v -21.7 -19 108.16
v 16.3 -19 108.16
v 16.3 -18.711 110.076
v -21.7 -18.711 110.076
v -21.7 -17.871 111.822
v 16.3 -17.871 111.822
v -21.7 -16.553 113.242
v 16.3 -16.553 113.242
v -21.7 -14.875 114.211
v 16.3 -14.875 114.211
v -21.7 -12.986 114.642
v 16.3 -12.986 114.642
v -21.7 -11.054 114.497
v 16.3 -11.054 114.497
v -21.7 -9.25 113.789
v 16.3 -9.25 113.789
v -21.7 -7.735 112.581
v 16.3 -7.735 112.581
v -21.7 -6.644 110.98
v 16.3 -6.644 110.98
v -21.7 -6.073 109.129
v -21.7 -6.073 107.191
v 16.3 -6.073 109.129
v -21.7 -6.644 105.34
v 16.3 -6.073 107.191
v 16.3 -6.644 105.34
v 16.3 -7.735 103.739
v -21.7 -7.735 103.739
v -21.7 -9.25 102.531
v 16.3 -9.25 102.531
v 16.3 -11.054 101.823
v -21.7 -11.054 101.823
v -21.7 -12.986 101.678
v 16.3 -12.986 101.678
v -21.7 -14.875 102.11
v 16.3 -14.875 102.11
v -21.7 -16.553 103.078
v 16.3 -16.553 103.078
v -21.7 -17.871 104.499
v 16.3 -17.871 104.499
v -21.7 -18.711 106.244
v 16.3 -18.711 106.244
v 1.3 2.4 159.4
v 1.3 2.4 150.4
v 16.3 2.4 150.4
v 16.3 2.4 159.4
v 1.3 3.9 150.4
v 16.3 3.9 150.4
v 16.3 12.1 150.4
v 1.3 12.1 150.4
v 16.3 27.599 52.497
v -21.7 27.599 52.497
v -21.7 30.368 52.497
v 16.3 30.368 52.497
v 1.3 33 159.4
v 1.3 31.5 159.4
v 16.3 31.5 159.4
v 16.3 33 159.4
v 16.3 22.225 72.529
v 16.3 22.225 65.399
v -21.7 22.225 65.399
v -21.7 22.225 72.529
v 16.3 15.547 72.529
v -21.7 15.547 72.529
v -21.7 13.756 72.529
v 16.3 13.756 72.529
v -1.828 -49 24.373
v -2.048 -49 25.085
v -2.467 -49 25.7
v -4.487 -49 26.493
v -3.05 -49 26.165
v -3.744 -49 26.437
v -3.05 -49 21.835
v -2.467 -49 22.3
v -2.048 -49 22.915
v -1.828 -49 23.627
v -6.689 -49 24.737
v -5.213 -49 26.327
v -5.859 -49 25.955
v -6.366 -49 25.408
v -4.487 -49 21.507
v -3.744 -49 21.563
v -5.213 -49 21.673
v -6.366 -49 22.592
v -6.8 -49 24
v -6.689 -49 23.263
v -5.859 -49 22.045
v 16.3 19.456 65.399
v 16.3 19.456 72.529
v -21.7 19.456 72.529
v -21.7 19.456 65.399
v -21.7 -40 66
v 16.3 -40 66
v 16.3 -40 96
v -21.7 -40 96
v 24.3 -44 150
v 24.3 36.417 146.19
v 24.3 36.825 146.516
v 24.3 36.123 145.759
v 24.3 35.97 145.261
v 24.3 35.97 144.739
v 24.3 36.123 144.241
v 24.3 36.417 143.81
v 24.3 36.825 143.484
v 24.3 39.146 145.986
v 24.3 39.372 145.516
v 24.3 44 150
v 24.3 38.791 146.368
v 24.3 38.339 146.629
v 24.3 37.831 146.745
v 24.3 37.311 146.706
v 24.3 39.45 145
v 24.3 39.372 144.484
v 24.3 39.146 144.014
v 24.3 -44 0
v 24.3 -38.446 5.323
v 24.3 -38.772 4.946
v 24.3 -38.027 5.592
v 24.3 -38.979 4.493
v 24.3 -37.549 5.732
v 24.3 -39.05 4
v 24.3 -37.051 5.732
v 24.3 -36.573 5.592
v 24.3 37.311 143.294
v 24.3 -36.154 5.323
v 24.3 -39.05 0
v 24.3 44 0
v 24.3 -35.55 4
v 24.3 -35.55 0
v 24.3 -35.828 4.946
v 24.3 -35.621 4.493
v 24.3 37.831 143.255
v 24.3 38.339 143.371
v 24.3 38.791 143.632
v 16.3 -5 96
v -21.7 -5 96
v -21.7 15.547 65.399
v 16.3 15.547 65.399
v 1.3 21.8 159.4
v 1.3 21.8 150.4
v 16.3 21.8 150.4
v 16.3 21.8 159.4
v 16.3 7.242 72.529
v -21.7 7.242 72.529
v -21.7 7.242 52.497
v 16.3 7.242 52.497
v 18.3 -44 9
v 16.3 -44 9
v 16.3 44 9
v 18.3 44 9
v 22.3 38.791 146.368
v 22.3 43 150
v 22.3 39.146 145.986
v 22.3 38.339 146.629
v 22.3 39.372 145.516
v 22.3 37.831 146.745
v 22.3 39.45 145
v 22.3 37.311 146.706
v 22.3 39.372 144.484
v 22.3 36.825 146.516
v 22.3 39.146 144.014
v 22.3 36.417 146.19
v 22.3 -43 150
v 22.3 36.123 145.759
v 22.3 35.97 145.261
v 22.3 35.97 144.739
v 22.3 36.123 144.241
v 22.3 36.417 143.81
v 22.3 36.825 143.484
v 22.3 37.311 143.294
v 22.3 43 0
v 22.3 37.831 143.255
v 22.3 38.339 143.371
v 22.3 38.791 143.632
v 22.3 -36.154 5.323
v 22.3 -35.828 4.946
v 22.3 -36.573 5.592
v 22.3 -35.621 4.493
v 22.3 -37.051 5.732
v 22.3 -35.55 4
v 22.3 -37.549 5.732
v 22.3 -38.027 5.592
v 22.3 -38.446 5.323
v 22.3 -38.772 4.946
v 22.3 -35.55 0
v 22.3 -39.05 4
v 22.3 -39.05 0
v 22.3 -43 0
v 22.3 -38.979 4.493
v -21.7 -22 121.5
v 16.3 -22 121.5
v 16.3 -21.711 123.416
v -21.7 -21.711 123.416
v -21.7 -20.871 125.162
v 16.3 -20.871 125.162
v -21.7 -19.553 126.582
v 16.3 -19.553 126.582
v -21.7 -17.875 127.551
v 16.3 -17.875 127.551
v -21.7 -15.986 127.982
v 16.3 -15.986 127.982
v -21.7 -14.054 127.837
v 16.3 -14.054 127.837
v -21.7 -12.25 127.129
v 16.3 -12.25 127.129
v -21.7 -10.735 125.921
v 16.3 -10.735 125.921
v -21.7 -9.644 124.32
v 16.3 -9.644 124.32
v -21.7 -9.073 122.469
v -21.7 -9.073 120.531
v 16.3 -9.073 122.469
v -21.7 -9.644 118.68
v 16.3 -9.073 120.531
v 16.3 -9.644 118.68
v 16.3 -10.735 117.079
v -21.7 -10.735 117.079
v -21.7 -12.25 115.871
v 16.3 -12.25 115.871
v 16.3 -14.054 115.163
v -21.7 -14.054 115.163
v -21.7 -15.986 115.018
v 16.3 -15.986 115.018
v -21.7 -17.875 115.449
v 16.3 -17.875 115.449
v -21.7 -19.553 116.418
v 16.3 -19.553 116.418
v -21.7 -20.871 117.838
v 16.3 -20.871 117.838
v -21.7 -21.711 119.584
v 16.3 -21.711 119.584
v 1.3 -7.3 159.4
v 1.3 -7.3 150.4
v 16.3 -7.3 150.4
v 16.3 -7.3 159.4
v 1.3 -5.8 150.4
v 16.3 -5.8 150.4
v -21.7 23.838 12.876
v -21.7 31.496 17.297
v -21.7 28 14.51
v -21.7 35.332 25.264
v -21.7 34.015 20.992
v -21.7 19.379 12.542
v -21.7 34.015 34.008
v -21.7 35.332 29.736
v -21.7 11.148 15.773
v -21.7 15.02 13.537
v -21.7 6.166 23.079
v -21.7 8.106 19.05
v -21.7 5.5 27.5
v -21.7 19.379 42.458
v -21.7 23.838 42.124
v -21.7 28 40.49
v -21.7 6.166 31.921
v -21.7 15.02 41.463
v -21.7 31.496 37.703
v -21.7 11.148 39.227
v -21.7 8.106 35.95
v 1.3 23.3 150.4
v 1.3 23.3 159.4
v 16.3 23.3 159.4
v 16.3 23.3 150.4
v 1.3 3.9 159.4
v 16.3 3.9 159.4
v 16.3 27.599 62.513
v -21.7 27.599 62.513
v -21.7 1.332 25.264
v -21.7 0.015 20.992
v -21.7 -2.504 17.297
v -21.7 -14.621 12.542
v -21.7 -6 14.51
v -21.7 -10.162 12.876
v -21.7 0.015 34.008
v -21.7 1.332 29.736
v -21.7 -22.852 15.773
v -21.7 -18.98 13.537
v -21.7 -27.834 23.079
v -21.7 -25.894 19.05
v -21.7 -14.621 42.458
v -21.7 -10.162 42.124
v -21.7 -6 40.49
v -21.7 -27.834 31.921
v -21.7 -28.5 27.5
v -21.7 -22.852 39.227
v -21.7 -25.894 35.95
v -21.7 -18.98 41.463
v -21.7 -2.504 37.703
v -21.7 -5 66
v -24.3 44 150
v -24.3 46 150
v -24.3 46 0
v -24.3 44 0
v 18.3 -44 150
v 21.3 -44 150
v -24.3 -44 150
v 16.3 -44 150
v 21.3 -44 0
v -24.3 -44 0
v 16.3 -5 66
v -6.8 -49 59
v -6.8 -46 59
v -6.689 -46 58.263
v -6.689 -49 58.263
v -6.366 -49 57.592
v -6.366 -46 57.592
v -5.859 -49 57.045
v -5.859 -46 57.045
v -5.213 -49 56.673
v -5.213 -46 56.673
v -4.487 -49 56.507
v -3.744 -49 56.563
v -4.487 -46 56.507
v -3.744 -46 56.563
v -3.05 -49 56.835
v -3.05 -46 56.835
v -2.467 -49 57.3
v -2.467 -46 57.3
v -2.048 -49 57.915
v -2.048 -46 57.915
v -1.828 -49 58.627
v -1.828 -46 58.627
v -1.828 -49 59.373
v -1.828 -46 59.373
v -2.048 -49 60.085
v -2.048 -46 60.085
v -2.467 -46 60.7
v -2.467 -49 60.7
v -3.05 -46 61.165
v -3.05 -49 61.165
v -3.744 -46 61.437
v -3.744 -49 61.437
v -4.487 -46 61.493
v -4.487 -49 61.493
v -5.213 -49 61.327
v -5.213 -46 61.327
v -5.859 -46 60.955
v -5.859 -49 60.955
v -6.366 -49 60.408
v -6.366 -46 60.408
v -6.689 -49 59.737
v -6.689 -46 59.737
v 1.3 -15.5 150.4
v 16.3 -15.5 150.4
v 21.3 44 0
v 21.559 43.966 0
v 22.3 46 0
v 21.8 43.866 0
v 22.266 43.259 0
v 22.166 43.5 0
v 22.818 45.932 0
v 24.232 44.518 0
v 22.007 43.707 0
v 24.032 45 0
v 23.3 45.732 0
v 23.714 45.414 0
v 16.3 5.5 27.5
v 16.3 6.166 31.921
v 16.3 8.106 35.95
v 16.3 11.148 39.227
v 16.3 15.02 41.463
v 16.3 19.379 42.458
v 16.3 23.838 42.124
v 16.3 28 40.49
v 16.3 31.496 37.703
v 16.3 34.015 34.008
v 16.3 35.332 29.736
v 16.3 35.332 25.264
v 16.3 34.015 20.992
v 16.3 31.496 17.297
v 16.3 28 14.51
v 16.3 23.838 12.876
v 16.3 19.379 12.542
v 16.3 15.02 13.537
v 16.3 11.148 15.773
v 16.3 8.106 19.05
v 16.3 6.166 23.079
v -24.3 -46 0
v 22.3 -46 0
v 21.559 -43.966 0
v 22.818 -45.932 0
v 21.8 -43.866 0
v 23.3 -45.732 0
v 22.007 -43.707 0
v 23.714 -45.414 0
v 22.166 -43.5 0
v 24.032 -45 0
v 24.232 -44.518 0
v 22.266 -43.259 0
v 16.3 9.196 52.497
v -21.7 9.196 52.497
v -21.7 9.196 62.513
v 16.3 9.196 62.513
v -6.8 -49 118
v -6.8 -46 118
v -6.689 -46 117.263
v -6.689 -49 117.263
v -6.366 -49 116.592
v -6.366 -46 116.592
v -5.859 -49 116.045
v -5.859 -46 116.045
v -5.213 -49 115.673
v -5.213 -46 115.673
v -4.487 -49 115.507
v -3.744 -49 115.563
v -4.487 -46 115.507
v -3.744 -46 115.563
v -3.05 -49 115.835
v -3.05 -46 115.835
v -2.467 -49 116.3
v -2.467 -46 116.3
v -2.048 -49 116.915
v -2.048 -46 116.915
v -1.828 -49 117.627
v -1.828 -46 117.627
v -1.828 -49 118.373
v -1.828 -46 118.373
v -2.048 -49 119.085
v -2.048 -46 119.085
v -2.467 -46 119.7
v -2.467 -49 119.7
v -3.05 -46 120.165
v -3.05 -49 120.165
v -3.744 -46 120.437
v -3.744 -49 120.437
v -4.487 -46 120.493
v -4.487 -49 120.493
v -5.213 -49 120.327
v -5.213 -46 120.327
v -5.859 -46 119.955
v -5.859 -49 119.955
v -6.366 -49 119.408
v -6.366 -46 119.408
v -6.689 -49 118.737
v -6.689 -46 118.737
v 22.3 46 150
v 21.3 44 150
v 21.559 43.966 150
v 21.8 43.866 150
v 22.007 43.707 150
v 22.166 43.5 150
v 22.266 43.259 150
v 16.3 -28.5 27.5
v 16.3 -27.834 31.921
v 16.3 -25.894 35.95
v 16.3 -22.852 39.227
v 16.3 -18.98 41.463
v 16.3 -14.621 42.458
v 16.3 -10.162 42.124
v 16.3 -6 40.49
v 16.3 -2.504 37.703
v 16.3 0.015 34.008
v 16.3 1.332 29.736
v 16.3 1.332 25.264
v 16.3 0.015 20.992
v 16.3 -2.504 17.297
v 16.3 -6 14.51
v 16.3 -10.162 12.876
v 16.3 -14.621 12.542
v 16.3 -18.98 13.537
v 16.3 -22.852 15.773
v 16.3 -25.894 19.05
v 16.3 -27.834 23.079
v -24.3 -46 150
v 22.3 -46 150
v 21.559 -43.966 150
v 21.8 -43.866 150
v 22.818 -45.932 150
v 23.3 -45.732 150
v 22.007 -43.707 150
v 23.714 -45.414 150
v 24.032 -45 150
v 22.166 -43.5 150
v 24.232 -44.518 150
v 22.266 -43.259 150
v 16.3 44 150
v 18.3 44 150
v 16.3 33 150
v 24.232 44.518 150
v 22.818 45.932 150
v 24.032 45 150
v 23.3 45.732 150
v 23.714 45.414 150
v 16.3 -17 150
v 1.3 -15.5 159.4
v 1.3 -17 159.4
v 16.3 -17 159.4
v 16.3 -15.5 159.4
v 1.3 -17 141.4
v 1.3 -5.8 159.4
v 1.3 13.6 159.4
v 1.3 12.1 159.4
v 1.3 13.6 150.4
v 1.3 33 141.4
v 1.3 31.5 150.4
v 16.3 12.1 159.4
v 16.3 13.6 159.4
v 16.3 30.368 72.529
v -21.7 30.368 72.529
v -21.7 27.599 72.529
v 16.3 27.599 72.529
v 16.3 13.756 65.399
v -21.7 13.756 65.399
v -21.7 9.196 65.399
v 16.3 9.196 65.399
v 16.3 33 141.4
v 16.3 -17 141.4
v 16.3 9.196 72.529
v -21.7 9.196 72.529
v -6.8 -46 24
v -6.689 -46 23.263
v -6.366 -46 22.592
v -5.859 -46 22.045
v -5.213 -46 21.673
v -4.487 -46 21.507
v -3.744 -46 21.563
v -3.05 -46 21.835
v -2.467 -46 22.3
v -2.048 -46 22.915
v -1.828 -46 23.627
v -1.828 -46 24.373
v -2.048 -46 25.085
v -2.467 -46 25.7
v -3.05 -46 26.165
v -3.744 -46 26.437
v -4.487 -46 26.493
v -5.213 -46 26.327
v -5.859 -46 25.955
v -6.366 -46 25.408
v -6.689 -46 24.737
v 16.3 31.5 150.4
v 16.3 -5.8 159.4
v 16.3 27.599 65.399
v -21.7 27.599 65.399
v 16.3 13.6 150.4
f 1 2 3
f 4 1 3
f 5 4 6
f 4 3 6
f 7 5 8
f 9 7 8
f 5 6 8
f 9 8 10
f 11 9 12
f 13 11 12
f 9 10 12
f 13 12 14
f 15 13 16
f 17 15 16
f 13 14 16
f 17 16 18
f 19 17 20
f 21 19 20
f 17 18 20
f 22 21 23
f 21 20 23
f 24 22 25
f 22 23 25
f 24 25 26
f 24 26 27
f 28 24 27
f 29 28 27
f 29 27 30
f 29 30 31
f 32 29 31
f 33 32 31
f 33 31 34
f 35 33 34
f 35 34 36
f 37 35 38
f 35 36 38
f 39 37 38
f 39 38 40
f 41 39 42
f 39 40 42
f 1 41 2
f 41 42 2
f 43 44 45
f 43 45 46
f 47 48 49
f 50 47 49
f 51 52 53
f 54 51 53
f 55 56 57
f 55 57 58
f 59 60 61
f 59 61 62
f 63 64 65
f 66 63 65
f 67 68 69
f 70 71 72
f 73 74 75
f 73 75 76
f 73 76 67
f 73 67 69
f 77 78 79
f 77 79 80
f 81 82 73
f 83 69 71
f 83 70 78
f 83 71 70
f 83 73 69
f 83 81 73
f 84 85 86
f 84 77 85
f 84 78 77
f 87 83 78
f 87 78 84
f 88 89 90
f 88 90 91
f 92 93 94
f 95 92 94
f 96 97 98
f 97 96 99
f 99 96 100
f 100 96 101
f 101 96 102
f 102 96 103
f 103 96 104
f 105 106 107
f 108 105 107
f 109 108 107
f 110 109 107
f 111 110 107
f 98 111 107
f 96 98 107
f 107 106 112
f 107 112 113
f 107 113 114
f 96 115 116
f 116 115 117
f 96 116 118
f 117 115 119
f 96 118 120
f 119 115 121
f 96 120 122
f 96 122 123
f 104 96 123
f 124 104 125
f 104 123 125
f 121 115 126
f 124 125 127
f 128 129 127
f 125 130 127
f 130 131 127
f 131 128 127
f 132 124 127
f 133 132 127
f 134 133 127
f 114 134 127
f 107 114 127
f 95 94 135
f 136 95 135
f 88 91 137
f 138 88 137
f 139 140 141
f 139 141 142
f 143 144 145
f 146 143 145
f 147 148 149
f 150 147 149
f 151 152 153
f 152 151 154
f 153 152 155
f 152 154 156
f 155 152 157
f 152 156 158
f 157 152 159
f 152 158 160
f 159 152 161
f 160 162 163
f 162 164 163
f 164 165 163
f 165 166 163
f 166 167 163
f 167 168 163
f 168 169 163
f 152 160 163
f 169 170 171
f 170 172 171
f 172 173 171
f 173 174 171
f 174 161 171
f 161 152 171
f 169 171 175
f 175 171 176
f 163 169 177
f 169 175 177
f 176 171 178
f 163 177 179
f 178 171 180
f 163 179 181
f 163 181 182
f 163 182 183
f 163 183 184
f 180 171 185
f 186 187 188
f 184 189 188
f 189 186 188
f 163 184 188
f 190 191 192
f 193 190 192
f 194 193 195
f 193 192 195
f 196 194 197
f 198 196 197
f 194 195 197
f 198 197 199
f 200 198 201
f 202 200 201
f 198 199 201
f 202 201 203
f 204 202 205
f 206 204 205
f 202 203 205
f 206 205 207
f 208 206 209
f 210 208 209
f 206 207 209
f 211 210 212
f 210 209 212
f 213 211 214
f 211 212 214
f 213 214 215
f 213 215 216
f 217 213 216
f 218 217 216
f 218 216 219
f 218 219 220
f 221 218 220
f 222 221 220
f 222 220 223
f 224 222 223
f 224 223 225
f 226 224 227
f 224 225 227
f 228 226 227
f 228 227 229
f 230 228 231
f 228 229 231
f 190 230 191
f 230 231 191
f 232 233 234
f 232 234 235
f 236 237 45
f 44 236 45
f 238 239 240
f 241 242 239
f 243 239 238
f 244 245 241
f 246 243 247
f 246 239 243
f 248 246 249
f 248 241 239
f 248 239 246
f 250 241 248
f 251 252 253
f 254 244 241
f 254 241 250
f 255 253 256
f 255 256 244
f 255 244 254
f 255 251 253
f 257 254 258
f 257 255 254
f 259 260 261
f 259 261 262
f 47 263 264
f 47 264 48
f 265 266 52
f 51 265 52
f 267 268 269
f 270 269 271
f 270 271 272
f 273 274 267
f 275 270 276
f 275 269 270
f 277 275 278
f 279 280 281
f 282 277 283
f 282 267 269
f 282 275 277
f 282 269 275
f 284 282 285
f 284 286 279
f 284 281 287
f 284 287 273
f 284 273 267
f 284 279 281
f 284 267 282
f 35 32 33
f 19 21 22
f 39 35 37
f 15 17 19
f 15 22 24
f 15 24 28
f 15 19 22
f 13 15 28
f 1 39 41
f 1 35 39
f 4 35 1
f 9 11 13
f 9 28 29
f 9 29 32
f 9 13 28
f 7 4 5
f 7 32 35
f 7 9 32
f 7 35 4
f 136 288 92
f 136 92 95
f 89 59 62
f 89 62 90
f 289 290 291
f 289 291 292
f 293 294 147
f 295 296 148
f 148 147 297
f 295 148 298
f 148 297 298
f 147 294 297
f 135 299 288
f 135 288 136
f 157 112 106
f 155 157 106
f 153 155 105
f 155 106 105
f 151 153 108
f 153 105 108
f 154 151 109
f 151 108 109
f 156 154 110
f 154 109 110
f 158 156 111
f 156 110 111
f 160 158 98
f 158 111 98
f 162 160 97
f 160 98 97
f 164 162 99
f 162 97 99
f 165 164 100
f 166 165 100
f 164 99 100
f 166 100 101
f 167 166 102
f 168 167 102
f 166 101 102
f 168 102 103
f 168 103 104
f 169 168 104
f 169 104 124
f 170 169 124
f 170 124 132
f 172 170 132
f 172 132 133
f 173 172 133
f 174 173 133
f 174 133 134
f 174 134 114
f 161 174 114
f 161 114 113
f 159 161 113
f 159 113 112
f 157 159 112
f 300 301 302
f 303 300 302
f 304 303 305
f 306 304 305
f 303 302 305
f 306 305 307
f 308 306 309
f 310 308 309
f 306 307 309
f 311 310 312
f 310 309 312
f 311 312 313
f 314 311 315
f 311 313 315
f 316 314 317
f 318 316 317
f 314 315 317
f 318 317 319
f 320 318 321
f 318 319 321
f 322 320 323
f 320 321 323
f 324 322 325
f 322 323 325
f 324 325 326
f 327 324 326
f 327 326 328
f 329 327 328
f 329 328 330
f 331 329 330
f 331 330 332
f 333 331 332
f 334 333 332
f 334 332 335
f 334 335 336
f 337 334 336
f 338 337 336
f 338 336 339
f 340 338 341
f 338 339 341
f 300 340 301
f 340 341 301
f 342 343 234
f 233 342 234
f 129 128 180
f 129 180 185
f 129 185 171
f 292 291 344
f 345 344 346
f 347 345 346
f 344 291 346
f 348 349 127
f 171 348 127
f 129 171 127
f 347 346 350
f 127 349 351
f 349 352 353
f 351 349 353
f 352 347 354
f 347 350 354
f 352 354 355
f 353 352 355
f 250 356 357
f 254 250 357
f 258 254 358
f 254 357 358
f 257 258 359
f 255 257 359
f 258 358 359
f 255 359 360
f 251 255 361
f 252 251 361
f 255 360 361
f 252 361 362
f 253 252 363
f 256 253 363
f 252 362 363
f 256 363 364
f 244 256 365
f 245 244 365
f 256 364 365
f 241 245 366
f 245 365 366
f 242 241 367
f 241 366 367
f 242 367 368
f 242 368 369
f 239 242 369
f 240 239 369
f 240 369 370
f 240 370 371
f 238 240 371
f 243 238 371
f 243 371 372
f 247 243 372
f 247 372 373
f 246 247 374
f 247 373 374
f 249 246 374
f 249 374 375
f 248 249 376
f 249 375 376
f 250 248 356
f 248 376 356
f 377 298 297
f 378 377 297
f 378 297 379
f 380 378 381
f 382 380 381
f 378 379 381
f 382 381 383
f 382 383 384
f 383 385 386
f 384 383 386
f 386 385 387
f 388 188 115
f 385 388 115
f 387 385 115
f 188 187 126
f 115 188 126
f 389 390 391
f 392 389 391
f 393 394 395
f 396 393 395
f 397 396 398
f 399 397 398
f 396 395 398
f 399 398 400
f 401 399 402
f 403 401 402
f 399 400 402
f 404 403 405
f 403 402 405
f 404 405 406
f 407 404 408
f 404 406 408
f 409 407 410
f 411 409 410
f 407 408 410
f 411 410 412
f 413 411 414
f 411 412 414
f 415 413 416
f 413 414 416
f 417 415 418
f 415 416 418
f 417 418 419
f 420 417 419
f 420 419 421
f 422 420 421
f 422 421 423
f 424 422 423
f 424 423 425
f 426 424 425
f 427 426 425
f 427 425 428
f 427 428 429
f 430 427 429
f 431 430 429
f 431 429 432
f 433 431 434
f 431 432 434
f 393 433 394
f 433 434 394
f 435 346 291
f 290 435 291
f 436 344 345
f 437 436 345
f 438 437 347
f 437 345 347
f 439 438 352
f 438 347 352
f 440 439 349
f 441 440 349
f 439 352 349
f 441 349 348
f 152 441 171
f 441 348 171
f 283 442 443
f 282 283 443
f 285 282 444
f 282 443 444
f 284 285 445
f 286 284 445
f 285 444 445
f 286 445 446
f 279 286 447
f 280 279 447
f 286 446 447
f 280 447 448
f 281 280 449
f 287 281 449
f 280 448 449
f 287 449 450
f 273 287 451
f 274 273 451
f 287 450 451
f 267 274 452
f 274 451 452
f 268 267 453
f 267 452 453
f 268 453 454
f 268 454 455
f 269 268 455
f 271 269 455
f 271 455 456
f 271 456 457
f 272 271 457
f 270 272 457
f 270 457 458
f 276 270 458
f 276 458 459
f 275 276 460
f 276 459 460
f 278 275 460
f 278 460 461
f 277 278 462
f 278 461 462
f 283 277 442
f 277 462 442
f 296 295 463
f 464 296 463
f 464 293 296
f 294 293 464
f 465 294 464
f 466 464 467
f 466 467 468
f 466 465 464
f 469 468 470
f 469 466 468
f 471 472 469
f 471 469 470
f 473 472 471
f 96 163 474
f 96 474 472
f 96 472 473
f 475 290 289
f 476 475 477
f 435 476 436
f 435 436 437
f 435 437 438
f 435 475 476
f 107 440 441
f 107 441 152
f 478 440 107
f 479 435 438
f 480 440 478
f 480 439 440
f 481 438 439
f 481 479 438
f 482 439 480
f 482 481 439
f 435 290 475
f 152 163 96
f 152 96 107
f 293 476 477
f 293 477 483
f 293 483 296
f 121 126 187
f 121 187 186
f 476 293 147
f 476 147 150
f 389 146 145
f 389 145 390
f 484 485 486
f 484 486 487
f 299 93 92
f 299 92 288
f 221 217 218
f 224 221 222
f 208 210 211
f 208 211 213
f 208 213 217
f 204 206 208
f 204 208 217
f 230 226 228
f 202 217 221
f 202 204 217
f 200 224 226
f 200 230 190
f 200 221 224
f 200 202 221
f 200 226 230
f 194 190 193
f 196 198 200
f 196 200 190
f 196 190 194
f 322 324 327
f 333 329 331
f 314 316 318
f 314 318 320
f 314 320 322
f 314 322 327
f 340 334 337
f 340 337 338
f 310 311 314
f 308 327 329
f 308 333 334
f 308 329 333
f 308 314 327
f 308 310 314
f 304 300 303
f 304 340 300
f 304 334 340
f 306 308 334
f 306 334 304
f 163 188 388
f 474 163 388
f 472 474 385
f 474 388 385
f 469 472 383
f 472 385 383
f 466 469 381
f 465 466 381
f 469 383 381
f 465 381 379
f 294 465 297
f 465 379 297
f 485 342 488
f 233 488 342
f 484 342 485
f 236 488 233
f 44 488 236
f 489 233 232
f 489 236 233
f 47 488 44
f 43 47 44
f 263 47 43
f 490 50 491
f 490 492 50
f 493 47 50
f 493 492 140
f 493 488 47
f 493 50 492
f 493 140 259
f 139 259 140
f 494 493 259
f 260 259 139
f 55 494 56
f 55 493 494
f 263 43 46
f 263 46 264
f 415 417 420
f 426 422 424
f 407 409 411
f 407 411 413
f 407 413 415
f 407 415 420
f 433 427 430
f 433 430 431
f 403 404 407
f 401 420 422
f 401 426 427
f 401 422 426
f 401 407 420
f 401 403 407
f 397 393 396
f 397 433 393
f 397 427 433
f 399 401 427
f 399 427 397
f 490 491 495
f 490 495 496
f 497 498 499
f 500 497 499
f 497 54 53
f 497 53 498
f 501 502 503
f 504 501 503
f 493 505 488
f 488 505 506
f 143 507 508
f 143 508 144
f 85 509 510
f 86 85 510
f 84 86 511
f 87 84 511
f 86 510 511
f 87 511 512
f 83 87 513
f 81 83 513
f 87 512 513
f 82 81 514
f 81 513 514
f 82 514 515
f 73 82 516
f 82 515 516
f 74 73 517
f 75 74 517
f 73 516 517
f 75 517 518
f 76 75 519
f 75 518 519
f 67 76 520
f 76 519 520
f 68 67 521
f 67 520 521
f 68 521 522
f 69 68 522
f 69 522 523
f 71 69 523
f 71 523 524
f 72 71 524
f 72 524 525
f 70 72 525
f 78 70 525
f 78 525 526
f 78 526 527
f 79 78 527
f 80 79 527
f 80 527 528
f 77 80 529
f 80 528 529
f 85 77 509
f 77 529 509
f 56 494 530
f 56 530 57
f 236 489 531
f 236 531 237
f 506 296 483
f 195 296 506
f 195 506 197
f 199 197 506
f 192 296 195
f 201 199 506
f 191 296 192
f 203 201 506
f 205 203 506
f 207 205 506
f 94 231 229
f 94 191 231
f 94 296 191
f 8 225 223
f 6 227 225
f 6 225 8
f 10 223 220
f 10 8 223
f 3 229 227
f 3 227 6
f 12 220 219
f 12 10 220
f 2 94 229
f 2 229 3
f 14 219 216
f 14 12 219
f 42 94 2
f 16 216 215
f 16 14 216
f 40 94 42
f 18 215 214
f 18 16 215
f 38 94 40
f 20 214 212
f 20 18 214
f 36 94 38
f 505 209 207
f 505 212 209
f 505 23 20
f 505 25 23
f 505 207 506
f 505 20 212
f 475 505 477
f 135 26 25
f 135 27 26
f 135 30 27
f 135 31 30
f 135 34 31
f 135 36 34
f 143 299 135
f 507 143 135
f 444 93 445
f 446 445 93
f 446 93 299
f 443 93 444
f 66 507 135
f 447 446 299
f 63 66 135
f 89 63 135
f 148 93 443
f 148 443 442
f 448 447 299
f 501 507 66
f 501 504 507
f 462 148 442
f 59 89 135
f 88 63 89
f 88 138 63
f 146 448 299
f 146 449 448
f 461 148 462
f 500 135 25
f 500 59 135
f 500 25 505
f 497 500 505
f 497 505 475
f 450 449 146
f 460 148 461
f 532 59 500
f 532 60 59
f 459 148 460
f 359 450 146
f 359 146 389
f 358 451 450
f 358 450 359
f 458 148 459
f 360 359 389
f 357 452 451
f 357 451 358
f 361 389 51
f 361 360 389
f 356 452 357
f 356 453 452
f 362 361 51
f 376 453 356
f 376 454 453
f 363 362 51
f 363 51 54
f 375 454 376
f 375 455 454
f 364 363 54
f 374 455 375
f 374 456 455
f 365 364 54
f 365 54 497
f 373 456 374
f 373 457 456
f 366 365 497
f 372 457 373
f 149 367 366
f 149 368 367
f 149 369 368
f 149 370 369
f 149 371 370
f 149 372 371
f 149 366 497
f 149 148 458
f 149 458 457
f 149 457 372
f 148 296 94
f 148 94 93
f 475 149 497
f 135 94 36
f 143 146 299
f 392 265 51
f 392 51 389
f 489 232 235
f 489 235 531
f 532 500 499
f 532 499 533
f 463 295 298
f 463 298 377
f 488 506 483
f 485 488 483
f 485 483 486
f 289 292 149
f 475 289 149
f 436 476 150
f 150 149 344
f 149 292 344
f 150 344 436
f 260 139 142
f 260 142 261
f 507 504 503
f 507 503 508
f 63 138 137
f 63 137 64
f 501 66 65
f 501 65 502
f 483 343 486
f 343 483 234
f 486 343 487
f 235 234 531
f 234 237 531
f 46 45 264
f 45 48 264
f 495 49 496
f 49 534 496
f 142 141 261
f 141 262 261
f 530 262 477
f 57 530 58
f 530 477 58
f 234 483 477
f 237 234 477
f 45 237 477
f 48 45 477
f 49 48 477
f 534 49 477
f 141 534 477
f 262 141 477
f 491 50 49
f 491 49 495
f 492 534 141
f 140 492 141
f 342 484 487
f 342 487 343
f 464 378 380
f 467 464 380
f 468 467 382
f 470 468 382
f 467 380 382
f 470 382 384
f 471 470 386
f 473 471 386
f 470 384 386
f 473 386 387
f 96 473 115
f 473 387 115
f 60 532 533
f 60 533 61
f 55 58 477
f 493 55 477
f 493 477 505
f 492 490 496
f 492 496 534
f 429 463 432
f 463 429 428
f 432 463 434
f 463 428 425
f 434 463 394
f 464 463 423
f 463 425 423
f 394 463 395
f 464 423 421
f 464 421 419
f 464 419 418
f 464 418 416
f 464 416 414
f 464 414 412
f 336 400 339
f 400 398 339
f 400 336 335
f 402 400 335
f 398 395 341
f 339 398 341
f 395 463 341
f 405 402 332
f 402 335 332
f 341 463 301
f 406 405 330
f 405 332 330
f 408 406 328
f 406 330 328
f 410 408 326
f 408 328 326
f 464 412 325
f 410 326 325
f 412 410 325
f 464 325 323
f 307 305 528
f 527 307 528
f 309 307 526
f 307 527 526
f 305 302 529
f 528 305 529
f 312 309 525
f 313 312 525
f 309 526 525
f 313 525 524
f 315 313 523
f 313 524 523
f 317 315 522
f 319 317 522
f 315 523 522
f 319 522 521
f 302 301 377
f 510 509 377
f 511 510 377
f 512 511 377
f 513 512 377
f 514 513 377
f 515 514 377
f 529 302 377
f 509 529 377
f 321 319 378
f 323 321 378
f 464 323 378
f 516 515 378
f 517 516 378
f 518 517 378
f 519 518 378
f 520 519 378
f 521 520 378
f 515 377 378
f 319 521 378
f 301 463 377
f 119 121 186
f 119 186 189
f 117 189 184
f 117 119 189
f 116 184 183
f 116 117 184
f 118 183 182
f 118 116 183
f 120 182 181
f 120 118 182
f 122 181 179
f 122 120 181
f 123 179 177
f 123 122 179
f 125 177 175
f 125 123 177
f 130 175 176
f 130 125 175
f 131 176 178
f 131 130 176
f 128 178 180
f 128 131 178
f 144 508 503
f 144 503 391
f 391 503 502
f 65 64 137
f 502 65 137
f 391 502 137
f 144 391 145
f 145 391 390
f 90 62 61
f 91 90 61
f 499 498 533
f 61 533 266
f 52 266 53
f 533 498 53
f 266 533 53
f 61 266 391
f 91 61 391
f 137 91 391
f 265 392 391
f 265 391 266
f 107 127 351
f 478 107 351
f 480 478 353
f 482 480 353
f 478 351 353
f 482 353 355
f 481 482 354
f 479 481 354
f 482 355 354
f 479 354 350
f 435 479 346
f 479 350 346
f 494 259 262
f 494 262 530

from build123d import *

# Parameters (mm, degrees)
EXTRUDE_1_DEPTH     = 150
SKETCH_2_W          = 2
SKETCH_2_H          = 88
EXTRUDE_2_DEPTH     = 150
SKETCH_3_R          = 15
SKETCH_3_R_2        = 6.5
SKETCH_3_W          = 30
SKETCH_3_H          = 35
EXTRUDE_3_DEPTH     = 38
EXTRUDE_4_DEPTH     = 15
CUT_EXTRUDE_1_REACH = 174.877
SKETCH_5_R          = 1.75
SKETCH_6_R          = 2.5
EXTRUDE_5_DEPTH     = 3
CUT_EXTRUDE_2_REACH = 173.633
SKETCH_7_W          = 9
SKETCH_7_H          = 88


with BuildPart() as part:
    # 草图1 → 凸台-拉伸1 (new body)
    with BuildSketch(Plane.XY):
        with BuildLine():
            Line((-24.3, 44), (21.3, 44))
            ThreePointArc((21.3, 44), (22.007106781, 43.707106781), (22.3, 43))
            Line((22.3, 43), (22.3, -43))
            ThreePointArc((22.3, -43), (22.007106781, -43.707106781), (21.3, -44))
            Line((21.3, -44), (-24.3, -44))
            Line((-24.3, -44), (-24.3, -46))
            Line((-24.3, -46), (22.3, -46))
            ThreePointArc((22.3, -46), (23.714213562, -45.414213562), (24.3, -44))
            Line((24.3, -44), (24.3, 44))
            ThreePointArc((24.3, 44), (23.714213562, 45.414213562), (22.3, 46))
            Line((22.3, 46), (-24.3, 46))
            Line((-24.3, 46), (-24.3, 44))
        make_face()
    extrude(amount=EXTRUDE_1_DEPTH)

    # 草图2 → 凸台-拉伸2 (add)
    with BuildSketch(Plane(origin=(0, 0, 0), x_dir=(-1, 0, 0), z_dir=(0, 0, -1))):
        with Locations((-17.3, 0)):
            Rectangle(SKETCH_2_W, SKETCH_2_H)
    extrude(amount=-EXTRUDE_2_DEPTH)

    # 草图3 → 凸台-拉伸3 (add)
    with BuildSketch(Plane.ZY.offset(-16.3)):
        with Locations(Location((27.5, 20.5, 0), (0, 0, 270))):
            Circle(SKETCH_3_R)
        with Locations(Location((27.5, -13.5, 0), (0, 0, 270))):
            Circle(SKETCH_3_R)
        with Locations(Location((108.160228903, -12.5, 0), (0, 0, 270))):
            Circle(SKETCH_3_R_2)
        with Locations(Location((121.5, -15.5, 0), (0, 0, 270))):
            Circle(SKETCH_3_R_2)
        with Locations((81, -22.5)):
            Rectangle(SKETCH_3_W, SKETCH_3_H)
        Polygon((52.497113206, 30.367528908), (72.528628507, 30.367528908), (72.528628507, 27.598945493), (65.398687695, 27.598945493), (65.398687695, 22.22463651), (72.528628507, 22.22463651), (72.528628507, 19.456053094), (65.398687695, 19.456053094), (65.398687695, 15.547464743), (72.528628507, 15.547464743), (72.528628507, 13.756028415), (65.398687695, 13.756028415), (65.398687695, 9.196008671), (72.528628507, 9.196008671), (72.528628507, 7.241714496), (52.497113206, 7.241714496), (52.497113206, 9.196008671), (62.512870856, 9.196008671), (62.512870856, 27.598945493), (52.497113206, 27.598945493), align=None)
    extrude(amount=EXTRUDE_3_DEPTH)

    # 草图4 → 凸台-拉伸4 (add)
    with BuildSketch(Plane.ZY.offset(-16.3)):
        Polygon((159.4, 33), (141.4, 33), (141.4, -17), (159.4, -17), (159.4, -15.5), (150.4, -15.5), (150.4, -7.3), (159.4, -7.3), (159.4, -5.8), (150.4, -5.8), (150.4, 2.4), (159.4, 2.4), (159.4, 3.9), (150.4, 3.9), (150.4, 12.1), (159.4, 12.1), (159.4, 13.6), (150.4, 13.6), (150.4, 21.8), (159.4, 21.8), (159.4, 23.3), (150.4, 23.3), (150.4, 31.5), (159.4, 31.5), align=None)
    extrude(amount=EXTRUDE_4_DEPTH)

    # 草图5 → 切除-拉伸1 (cut, up to next)
    with BuildSketch(Plane(origin=(24.3, 0, 0), x_dir=(0, 0, -1), z_dir=(1, 0, 0)), mode=Mode.PRIVATE) as cut_extrude_1_sk1:
        with Locations(Location((-145, 37.7, 0), (0, 0, 90))):
            Circle(SKETCH_5_R)
    cut_extrude_1_tool1 = extrude(cut_extrude_1_sk1.sketch, amount=-CUT_EXTRUDE_1_REACH, mode=Mode.PRIVATE) & part.part
    # 草图5 → 切除-拉伸1 (cut, up to next)
    with BuildSketch(Plane(origin=(24.3, 0, 0), x_dir=(0, 0, -1), z_dir=(1, 0, 0)), mode=Mode.PRIVATE) as cut_extrude_1_sk2:
        with BuildLine():
            Line((-4, -35.55), (0, -35.55))
            Line((0, -35.55), (0, -39.05))
            Line((0, -39.05), (-4, -39.05))
            ThreePointArc((-4, -39.05), (-5.75, -37.3), (-4, -35.55))
        make_face()
    cut_extrude_1_tool2 = extrude(cut_extrude_1_sk2.sketch, amount=-CUT_EXTRUDE_1_REACH, mode=Mode.PRIVATE) & part.part
    add(cut_extrude_1_tool1.solids().sort_by_distance((24.3, 37.7, 145))[0], mode=Mode.SUBTRACT)
    add(cut_extrude_1_tool2.solids().sort_by_distance((24.3, -37.3, 2.701417))[0], mode=Mode.SUBTRACT)

    # 草图6 → 凸台-拉伸5 (add)
    with BuildSketch(Plane.XZ.offset(46)):
        with Locations(Location((-4.3, 118, 0), (0, 0, 180))):
            Circle(SKETCH_6_R)
        with Locations(Location((-4.3, 59, 0), (0, 0, 180))):
            Circle(SKETCH_6_R)
        with Locations(Location((-4.3, 24, 0), (0, 0, 180))):
            Circle(SKETCH_6_R)
    extrude(amount=EXTRUDE_5_DEPTH)

    # 草图7 → 切除-拉伸2 (cut, up to next)
    with BuildSketch(Plane.ZY.offset(-16.3), mode=Mode.PRIVATE) as cut_extrude_2_sk1:
        with Locations((4.5, 0)):
            Rectangle(SKETCH_7_W, SKETCH_7_H)
    cut_extrude_2_tool1 = extrude(cut_extrude_2_sk1.sketch, amount=-CUT_EXTRUDE_2_REACH, mode=Mode.PRIVATE) & part.part
    add(cut_extrude_2_tool1.solids().sort_by_distance((16.3, 0, 4.5))[0], mode=Mode.SUBTRACT)


solid = part.part
